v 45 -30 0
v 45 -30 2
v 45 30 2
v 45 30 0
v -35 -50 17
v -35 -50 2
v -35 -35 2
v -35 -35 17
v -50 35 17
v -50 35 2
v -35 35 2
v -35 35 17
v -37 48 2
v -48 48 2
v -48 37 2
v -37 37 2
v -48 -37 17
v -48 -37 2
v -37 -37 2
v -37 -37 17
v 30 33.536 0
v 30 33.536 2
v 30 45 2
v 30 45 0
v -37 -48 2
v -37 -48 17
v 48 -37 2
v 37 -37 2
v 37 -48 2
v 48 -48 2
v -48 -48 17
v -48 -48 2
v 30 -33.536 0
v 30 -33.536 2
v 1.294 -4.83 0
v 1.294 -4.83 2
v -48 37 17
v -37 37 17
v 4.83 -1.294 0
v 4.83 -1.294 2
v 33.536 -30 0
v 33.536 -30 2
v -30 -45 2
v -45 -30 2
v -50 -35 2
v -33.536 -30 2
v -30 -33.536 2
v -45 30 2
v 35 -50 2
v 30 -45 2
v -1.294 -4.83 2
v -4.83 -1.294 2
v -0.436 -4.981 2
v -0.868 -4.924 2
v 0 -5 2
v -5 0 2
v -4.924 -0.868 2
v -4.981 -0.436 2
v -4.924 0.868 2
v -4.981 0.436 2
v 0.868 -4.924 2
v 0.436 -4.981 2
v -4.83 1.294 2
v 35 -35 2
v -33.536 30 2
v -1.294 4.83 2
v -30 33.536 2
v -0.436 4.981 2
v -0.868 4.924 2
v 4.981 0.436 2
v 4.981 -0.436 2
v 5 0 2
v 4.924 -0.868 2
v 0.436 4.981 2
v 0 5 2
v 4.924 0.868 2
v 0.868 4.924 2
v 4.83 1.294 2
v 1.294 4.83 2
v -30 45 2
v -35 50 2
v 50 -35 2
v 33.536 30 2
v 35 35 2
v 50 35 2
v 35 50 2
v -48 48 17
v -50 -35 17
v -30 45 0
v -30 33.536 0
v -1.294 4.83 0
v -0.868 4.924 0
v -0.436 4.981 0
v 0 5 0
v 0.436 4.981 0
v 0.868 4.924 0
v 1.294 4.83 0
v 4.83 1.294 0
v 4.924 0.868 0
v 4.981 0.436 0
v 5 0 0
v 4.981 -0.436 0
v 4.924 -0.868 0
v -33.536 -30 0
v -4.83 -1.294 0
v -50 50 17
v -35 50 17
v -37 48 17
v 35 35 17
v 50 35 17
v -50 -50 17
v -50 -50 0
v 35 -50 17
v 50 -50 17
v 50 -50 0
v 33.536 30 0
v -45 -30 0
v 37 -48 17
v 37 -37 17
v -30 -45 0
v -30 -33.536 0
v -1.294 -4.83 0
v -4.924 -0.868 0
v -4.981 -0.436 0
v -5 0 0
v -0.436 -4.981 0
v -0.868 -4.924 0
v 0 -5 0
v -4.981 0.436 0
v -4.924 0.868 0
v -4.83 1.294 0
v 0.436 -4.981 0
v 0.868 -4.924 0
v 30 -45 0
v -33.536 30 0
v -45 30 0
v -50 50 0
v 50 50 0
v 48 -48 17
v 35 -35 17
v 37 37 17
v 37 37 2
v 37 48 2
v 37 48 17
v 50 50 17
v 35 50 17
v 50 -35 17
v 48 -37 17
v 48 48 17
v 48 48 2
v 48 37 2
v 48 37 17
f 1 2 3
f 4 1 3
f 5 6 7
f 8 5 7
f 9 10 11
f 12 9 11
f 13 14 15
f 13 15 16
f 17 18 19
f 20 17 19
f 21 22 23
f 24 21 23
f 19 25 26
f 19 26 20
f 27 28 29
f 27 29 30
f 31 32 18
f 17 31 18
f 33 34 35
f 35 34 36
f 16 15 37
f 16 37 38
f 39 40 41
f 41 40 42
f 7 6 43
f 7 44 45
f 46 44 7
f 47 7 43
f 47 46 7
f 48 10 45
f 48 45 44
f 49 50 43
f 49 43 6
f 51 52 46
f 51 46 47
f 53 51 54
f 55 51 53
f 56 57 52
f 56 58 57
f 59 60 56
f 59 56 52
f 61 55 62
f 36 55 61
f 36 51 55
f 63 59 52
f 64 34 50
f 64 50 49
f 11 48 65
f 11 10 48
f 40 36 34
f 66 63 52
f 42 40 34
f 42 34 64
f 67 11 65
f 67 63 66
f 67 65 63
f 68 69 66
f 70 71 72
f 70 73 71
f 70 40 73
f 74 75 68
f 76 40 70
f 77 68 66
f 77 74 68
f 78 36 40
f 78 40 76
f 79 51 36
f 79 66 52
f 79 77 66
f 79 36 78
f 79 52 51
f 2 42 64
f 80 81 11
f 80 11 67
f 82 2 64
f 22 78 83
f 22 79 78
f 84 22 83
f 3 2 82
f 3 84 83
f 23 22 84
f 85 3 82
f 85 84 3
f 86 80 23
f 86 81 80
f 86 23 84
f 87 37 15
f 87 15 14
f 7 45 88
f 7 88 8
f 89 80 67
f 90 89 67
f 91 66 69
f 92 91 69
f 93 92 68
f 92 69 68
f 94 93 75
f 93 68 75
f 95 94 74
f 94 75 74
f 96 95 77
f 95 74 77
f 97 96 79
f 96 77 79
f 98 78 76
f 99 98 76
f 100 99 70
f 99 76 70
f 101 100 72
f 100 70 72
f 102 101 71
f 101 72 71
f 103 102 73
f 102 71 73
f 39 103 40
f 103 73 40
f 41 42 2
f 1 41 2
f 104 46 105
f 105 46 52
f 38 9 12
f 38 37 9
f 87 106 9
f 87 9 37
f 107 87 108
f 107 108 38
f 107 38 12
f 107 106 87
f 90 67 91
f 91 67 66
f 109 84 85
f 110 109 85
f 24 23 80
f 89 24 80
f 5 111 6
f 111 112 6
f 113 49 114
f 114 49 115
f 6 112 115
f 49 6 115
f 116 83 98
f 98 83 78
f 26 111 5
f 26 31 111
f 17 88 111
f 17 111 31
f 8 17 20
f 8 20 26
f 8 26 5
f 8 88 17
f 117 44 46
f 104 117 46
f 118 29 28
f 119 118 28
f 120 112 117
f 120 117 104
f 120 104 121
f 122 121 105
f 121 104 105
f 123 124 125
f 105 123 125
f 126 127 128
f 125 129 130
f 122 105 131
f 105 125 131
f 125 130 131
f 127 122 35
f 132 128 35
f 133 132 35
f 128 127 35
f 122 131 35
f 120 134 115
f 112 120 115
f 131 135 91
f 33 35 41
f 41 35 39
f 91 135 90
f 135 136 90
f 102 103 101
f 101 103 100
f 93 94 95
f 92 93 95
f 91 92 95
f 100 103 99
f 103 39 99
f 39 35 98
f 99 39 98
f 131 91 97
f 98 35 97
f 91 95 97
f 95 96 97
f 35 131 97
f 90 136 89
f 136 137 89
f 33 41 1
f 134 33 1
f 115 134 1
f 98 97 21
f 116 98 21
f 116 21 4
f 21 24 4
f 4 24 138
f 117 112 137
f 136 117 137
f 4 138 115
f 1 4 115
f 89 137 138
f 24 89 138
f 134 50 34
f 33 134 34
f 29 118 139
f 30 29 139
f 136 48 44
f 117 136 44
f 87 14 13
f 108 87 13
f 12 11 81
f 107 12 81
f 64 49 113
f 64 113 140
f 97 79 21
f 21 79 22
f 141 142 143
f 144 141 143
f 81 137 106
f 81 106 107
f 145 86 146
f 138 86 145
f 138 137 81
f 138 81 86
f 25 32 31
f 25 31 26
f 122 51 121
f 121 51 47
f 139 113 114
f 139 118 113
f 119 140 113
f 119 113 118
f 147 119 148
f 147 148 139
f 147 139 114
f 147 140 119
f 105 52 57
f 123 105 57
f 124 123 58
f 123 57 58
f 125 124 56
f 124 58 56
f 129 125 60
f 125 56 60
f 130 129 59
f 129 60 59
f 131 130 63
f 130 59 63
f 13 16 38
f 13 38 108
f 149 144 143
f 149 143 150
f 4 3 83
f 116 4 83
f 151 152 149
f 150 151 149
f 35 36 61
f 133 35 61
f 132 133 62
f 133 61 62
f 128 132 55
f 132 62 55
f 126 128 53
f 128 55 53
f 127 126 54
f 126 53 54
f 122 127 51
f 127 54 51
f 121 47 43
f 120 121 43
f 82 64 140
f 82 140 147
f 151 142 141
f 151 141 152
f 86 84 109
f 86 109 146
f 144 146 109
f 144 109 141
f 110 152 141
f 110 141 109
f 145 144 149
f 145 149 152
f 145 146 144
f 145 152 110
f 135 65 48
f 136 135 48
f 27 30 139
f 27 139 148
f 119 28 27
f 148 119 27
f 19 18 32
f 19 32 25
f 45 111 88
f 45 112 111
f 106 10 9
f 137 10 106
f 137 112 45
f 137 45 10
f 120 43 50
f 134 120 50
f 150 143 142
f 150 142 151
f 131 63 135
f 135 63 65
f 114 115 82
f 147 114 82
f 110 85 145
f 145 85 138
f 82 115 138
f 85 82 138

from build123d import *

# Parameters (mm, degrees)
F0_W        = 100
F0_H        = 100
F1_DEPTH    = 2
F2_W        = 15
F2_H        = 15
F3_DEPTH    = 15
F4_T        = 2
F4_T3_DEPTH = 19
F4_T5_DEPTH = 19
F4_T7_DEPTH = 19
F4_T9_DEPTH = 19
F6_DEPTH    = 2.001


# Not quite as in the source:
# - a shell that OpenCascade refuses in one call is made with other operations: the cavity is built on its own and cut out


with BuildPart() as f1:
    # F0 (on Top) → F1 (new body)
    with BuildSketch(Plane.XY):
        Rectangle(F0_W, F0_H)
    extrude(amount=F1_DEPTH)

    # F2 (on face) → F3 (join)
    with BuildSketch(Plane.XY.offset(2)):
        with Locations((-42.5, -42.5)):
            Rectangle(F2_W, F2_H)
        with Locations((-42.5, 42.5)):
            Rectangle(F2_W, F2_H)
        with Locations((42.5, 42.5)):
            Rectangle(F2_W, F2_H)
        with Locations((42.5, -42.5)):
            Rectangle(F2_W, F2_H)
    extrude(amount=F3_DEPTH)

    # F4: shell of thickness 2, made by hand


with BuildPart() as f4_core1:
    # F4_t2: copy of F1
    add(f1.part)

    # the walls: a layer under each face that stays
    f4_faces = [f4_core1.faces().sort_by_distance(p)[0] for p in [
        (50, -42.8571428571, 15.7857142857),
        (0, 0, 0),
        (-50, 42.8571428571, 15.7857142857),
        (-35, -42.5, 9.5),
        (-42.5, -35, 9.5),
        (-42.5, 35, 9.5),
        (-35, 42.5, 9.5),
        (42.8571428571, 50, 15.7857142857),
        (35, 42.5, 9.5),
        (42.5, 35, 9.5),
        (0, 0, 2),
        (35, -42.5, 9.5),
        (42.5, -35, 9.5),
        (-42.8571428571, -50, 15.7857142857),
    ]]
    thicken(f4_faces, amount=-F4_T, mode=Mode.SUBTRACT)

    # F4_s4 → F4_t3 (cut)
    with BuildSketch(Plane.XZ.offset(33)):
        Polygon((-34.98, 2.02), (-37, 2), (-37, 0), (-35, 0), align=None)
        Polygon((34.98, 2.02), (35, 0), (37, 0), (37, 2), align=None)
    extrude(amount=F4_T3_DEPTH, mode=Mode.SUBTRACT)

    # F4_s6 → F4_t5 (cut)
    with BuildSketch(Plane.YZ.offset(-52)):
        Polygon((-34.98, 2.02), (-37, 2), (-37, 0), (-35, 0), align=None)
        Polygon((34.98, 2.02), (37, 2), (37, 0), (35, 0), align=None)
    extrude(amount=F4_T5_DEPTH, mode=Mode.SUBTRACT)

    # F4_s8 → F4_t7 (cut)
    with BuildSketch(Plane.XZ.offset(-52)):
        Polygon((-34.98, 2.02), (-37, 2), (-37, 0), (-35, 0), align=None)
        Polygon((34.98, 2.02), (37, 2), (37, 0), (35, 0), align=None)
    extrude(amount=F4_T7_DEPTH, mode=Mode.SUBTRACT)

    # F4_s10 → F4_t9 (cut)
    with BuildSketch(Plane.YZ.offset(33)):
        Polygon((34.98, 2.02), (37, 2), (37, 0), (35, 0), align=None)
        Polygon((-34.98, 2.02), (-35, 0), (-37, 0), (-37, 2), align=None)
    extrude(amount=F4_T9_DEPTH, mode=Mode.SUBTRACT)


with BuildPart() as f1_1:
    add(f1.part)

    # what is left inside the walls is the cavity
    f4_cavity = [f4_core1.part.solids().sort_by_distance(p)[0] for p in [
        (47.98, -42.5, 12),
        (47.98, 42.5, 12),
        (-42.5, -47.98, 12),
        (-37.02, 42.5, 12),
    ]]
    add(f4_cavity, mode=Mode.SUBTRACT)

    # F5 (on face) → F6 (cut, through all)
    with BuildSketch(Plane.XY.offset(2)):
        with BuildLine():
            Line((-30.0000010431, -45.0000010431), (30.0000010431, -45.0000010431))
            Line((30.0000010431, -45.0000010431), (30.0000010431, -33.535534949))
            Line((30.0000010431, -33.535534949), (1.2940952255, -4.8296291314))
            ThreePointArc((1.2940952255, -4.8296291314), (0, -5), (-1.2940952255, -4.8296291314))
            Line((-1.2940952255, -4.8296291314), (-30.0000010431, -33.535534949))
            Line((-30.0000010431, -33.535534949), (-30.0000010431, -45.0000010431))
        make_face()
        with BuildLine():
            Line((-33.535534949, 30.0000010431), (-45.0000010431, 30.0000010431))
            Line((-45.0000010431, 30.0000010431), (-45.0000010431, -30.0000010431))
            Line((-45.0000010431, -30.0000010431), (-33.535534949, -30.0000010431))
            Line((-33.535534949, -30.0000010431), (-4.8296291314, -1.2940952255))
            ThreePointArc((-4.8296291314, -1.2940952255), (-5, 0), (-4.8296291314, 1.2940952255))
            Line((-4.8296291314, 1.2940952255), (-33.535534949, 30.0000010431))
        make_face()
        with BuildLine():
            Line((30.0000010431, 45.0000010431), (-30.0000010431, 45.0000010431))
            Line((-30.0000010431, 45.0000010431), (-30.0000010431, 33.535534949))
            Line((-30.0000010431, 33.535534949), (-1.2940952255, 4.8296291314))
            ThreePointArc((-1.2940952255, 4.8296291314), (0, 5), (1.2940952255, 4.8296291314))
            Line((1.2940952255, 4.8296291314), (30.0000010431, 33.535534949))
            Line((30.0000010431, 33.535534949), (30.0000010431, 45.0000010431))
        make_face()
        with BuildLine():
            Line((45.0000010431, -30.0000010431), (45.0000010431, 30.0000010431))
            Line((45.0000010431, 30.0000010431), (33.535534949, 30.0000010431))
            Line((33.535534949, 30.0000010431), (4.8296291314, 1.2940952255))
            ThreePointArc((4.8296291314, 1.2940952255), (5, 0), (4.8296291314, -1.2940952255))
            Line((4.8296291314, -1.2940952255), (33.535534949, -30.0000010431))
            Line((33.535534949, -30.0000010431), (45.0000010431, -30.0000010431))
        make_face()
    extrude(amount=-F6_DEPTH, mode=Mode.SUBTRACT)


solid = f1_1.part
